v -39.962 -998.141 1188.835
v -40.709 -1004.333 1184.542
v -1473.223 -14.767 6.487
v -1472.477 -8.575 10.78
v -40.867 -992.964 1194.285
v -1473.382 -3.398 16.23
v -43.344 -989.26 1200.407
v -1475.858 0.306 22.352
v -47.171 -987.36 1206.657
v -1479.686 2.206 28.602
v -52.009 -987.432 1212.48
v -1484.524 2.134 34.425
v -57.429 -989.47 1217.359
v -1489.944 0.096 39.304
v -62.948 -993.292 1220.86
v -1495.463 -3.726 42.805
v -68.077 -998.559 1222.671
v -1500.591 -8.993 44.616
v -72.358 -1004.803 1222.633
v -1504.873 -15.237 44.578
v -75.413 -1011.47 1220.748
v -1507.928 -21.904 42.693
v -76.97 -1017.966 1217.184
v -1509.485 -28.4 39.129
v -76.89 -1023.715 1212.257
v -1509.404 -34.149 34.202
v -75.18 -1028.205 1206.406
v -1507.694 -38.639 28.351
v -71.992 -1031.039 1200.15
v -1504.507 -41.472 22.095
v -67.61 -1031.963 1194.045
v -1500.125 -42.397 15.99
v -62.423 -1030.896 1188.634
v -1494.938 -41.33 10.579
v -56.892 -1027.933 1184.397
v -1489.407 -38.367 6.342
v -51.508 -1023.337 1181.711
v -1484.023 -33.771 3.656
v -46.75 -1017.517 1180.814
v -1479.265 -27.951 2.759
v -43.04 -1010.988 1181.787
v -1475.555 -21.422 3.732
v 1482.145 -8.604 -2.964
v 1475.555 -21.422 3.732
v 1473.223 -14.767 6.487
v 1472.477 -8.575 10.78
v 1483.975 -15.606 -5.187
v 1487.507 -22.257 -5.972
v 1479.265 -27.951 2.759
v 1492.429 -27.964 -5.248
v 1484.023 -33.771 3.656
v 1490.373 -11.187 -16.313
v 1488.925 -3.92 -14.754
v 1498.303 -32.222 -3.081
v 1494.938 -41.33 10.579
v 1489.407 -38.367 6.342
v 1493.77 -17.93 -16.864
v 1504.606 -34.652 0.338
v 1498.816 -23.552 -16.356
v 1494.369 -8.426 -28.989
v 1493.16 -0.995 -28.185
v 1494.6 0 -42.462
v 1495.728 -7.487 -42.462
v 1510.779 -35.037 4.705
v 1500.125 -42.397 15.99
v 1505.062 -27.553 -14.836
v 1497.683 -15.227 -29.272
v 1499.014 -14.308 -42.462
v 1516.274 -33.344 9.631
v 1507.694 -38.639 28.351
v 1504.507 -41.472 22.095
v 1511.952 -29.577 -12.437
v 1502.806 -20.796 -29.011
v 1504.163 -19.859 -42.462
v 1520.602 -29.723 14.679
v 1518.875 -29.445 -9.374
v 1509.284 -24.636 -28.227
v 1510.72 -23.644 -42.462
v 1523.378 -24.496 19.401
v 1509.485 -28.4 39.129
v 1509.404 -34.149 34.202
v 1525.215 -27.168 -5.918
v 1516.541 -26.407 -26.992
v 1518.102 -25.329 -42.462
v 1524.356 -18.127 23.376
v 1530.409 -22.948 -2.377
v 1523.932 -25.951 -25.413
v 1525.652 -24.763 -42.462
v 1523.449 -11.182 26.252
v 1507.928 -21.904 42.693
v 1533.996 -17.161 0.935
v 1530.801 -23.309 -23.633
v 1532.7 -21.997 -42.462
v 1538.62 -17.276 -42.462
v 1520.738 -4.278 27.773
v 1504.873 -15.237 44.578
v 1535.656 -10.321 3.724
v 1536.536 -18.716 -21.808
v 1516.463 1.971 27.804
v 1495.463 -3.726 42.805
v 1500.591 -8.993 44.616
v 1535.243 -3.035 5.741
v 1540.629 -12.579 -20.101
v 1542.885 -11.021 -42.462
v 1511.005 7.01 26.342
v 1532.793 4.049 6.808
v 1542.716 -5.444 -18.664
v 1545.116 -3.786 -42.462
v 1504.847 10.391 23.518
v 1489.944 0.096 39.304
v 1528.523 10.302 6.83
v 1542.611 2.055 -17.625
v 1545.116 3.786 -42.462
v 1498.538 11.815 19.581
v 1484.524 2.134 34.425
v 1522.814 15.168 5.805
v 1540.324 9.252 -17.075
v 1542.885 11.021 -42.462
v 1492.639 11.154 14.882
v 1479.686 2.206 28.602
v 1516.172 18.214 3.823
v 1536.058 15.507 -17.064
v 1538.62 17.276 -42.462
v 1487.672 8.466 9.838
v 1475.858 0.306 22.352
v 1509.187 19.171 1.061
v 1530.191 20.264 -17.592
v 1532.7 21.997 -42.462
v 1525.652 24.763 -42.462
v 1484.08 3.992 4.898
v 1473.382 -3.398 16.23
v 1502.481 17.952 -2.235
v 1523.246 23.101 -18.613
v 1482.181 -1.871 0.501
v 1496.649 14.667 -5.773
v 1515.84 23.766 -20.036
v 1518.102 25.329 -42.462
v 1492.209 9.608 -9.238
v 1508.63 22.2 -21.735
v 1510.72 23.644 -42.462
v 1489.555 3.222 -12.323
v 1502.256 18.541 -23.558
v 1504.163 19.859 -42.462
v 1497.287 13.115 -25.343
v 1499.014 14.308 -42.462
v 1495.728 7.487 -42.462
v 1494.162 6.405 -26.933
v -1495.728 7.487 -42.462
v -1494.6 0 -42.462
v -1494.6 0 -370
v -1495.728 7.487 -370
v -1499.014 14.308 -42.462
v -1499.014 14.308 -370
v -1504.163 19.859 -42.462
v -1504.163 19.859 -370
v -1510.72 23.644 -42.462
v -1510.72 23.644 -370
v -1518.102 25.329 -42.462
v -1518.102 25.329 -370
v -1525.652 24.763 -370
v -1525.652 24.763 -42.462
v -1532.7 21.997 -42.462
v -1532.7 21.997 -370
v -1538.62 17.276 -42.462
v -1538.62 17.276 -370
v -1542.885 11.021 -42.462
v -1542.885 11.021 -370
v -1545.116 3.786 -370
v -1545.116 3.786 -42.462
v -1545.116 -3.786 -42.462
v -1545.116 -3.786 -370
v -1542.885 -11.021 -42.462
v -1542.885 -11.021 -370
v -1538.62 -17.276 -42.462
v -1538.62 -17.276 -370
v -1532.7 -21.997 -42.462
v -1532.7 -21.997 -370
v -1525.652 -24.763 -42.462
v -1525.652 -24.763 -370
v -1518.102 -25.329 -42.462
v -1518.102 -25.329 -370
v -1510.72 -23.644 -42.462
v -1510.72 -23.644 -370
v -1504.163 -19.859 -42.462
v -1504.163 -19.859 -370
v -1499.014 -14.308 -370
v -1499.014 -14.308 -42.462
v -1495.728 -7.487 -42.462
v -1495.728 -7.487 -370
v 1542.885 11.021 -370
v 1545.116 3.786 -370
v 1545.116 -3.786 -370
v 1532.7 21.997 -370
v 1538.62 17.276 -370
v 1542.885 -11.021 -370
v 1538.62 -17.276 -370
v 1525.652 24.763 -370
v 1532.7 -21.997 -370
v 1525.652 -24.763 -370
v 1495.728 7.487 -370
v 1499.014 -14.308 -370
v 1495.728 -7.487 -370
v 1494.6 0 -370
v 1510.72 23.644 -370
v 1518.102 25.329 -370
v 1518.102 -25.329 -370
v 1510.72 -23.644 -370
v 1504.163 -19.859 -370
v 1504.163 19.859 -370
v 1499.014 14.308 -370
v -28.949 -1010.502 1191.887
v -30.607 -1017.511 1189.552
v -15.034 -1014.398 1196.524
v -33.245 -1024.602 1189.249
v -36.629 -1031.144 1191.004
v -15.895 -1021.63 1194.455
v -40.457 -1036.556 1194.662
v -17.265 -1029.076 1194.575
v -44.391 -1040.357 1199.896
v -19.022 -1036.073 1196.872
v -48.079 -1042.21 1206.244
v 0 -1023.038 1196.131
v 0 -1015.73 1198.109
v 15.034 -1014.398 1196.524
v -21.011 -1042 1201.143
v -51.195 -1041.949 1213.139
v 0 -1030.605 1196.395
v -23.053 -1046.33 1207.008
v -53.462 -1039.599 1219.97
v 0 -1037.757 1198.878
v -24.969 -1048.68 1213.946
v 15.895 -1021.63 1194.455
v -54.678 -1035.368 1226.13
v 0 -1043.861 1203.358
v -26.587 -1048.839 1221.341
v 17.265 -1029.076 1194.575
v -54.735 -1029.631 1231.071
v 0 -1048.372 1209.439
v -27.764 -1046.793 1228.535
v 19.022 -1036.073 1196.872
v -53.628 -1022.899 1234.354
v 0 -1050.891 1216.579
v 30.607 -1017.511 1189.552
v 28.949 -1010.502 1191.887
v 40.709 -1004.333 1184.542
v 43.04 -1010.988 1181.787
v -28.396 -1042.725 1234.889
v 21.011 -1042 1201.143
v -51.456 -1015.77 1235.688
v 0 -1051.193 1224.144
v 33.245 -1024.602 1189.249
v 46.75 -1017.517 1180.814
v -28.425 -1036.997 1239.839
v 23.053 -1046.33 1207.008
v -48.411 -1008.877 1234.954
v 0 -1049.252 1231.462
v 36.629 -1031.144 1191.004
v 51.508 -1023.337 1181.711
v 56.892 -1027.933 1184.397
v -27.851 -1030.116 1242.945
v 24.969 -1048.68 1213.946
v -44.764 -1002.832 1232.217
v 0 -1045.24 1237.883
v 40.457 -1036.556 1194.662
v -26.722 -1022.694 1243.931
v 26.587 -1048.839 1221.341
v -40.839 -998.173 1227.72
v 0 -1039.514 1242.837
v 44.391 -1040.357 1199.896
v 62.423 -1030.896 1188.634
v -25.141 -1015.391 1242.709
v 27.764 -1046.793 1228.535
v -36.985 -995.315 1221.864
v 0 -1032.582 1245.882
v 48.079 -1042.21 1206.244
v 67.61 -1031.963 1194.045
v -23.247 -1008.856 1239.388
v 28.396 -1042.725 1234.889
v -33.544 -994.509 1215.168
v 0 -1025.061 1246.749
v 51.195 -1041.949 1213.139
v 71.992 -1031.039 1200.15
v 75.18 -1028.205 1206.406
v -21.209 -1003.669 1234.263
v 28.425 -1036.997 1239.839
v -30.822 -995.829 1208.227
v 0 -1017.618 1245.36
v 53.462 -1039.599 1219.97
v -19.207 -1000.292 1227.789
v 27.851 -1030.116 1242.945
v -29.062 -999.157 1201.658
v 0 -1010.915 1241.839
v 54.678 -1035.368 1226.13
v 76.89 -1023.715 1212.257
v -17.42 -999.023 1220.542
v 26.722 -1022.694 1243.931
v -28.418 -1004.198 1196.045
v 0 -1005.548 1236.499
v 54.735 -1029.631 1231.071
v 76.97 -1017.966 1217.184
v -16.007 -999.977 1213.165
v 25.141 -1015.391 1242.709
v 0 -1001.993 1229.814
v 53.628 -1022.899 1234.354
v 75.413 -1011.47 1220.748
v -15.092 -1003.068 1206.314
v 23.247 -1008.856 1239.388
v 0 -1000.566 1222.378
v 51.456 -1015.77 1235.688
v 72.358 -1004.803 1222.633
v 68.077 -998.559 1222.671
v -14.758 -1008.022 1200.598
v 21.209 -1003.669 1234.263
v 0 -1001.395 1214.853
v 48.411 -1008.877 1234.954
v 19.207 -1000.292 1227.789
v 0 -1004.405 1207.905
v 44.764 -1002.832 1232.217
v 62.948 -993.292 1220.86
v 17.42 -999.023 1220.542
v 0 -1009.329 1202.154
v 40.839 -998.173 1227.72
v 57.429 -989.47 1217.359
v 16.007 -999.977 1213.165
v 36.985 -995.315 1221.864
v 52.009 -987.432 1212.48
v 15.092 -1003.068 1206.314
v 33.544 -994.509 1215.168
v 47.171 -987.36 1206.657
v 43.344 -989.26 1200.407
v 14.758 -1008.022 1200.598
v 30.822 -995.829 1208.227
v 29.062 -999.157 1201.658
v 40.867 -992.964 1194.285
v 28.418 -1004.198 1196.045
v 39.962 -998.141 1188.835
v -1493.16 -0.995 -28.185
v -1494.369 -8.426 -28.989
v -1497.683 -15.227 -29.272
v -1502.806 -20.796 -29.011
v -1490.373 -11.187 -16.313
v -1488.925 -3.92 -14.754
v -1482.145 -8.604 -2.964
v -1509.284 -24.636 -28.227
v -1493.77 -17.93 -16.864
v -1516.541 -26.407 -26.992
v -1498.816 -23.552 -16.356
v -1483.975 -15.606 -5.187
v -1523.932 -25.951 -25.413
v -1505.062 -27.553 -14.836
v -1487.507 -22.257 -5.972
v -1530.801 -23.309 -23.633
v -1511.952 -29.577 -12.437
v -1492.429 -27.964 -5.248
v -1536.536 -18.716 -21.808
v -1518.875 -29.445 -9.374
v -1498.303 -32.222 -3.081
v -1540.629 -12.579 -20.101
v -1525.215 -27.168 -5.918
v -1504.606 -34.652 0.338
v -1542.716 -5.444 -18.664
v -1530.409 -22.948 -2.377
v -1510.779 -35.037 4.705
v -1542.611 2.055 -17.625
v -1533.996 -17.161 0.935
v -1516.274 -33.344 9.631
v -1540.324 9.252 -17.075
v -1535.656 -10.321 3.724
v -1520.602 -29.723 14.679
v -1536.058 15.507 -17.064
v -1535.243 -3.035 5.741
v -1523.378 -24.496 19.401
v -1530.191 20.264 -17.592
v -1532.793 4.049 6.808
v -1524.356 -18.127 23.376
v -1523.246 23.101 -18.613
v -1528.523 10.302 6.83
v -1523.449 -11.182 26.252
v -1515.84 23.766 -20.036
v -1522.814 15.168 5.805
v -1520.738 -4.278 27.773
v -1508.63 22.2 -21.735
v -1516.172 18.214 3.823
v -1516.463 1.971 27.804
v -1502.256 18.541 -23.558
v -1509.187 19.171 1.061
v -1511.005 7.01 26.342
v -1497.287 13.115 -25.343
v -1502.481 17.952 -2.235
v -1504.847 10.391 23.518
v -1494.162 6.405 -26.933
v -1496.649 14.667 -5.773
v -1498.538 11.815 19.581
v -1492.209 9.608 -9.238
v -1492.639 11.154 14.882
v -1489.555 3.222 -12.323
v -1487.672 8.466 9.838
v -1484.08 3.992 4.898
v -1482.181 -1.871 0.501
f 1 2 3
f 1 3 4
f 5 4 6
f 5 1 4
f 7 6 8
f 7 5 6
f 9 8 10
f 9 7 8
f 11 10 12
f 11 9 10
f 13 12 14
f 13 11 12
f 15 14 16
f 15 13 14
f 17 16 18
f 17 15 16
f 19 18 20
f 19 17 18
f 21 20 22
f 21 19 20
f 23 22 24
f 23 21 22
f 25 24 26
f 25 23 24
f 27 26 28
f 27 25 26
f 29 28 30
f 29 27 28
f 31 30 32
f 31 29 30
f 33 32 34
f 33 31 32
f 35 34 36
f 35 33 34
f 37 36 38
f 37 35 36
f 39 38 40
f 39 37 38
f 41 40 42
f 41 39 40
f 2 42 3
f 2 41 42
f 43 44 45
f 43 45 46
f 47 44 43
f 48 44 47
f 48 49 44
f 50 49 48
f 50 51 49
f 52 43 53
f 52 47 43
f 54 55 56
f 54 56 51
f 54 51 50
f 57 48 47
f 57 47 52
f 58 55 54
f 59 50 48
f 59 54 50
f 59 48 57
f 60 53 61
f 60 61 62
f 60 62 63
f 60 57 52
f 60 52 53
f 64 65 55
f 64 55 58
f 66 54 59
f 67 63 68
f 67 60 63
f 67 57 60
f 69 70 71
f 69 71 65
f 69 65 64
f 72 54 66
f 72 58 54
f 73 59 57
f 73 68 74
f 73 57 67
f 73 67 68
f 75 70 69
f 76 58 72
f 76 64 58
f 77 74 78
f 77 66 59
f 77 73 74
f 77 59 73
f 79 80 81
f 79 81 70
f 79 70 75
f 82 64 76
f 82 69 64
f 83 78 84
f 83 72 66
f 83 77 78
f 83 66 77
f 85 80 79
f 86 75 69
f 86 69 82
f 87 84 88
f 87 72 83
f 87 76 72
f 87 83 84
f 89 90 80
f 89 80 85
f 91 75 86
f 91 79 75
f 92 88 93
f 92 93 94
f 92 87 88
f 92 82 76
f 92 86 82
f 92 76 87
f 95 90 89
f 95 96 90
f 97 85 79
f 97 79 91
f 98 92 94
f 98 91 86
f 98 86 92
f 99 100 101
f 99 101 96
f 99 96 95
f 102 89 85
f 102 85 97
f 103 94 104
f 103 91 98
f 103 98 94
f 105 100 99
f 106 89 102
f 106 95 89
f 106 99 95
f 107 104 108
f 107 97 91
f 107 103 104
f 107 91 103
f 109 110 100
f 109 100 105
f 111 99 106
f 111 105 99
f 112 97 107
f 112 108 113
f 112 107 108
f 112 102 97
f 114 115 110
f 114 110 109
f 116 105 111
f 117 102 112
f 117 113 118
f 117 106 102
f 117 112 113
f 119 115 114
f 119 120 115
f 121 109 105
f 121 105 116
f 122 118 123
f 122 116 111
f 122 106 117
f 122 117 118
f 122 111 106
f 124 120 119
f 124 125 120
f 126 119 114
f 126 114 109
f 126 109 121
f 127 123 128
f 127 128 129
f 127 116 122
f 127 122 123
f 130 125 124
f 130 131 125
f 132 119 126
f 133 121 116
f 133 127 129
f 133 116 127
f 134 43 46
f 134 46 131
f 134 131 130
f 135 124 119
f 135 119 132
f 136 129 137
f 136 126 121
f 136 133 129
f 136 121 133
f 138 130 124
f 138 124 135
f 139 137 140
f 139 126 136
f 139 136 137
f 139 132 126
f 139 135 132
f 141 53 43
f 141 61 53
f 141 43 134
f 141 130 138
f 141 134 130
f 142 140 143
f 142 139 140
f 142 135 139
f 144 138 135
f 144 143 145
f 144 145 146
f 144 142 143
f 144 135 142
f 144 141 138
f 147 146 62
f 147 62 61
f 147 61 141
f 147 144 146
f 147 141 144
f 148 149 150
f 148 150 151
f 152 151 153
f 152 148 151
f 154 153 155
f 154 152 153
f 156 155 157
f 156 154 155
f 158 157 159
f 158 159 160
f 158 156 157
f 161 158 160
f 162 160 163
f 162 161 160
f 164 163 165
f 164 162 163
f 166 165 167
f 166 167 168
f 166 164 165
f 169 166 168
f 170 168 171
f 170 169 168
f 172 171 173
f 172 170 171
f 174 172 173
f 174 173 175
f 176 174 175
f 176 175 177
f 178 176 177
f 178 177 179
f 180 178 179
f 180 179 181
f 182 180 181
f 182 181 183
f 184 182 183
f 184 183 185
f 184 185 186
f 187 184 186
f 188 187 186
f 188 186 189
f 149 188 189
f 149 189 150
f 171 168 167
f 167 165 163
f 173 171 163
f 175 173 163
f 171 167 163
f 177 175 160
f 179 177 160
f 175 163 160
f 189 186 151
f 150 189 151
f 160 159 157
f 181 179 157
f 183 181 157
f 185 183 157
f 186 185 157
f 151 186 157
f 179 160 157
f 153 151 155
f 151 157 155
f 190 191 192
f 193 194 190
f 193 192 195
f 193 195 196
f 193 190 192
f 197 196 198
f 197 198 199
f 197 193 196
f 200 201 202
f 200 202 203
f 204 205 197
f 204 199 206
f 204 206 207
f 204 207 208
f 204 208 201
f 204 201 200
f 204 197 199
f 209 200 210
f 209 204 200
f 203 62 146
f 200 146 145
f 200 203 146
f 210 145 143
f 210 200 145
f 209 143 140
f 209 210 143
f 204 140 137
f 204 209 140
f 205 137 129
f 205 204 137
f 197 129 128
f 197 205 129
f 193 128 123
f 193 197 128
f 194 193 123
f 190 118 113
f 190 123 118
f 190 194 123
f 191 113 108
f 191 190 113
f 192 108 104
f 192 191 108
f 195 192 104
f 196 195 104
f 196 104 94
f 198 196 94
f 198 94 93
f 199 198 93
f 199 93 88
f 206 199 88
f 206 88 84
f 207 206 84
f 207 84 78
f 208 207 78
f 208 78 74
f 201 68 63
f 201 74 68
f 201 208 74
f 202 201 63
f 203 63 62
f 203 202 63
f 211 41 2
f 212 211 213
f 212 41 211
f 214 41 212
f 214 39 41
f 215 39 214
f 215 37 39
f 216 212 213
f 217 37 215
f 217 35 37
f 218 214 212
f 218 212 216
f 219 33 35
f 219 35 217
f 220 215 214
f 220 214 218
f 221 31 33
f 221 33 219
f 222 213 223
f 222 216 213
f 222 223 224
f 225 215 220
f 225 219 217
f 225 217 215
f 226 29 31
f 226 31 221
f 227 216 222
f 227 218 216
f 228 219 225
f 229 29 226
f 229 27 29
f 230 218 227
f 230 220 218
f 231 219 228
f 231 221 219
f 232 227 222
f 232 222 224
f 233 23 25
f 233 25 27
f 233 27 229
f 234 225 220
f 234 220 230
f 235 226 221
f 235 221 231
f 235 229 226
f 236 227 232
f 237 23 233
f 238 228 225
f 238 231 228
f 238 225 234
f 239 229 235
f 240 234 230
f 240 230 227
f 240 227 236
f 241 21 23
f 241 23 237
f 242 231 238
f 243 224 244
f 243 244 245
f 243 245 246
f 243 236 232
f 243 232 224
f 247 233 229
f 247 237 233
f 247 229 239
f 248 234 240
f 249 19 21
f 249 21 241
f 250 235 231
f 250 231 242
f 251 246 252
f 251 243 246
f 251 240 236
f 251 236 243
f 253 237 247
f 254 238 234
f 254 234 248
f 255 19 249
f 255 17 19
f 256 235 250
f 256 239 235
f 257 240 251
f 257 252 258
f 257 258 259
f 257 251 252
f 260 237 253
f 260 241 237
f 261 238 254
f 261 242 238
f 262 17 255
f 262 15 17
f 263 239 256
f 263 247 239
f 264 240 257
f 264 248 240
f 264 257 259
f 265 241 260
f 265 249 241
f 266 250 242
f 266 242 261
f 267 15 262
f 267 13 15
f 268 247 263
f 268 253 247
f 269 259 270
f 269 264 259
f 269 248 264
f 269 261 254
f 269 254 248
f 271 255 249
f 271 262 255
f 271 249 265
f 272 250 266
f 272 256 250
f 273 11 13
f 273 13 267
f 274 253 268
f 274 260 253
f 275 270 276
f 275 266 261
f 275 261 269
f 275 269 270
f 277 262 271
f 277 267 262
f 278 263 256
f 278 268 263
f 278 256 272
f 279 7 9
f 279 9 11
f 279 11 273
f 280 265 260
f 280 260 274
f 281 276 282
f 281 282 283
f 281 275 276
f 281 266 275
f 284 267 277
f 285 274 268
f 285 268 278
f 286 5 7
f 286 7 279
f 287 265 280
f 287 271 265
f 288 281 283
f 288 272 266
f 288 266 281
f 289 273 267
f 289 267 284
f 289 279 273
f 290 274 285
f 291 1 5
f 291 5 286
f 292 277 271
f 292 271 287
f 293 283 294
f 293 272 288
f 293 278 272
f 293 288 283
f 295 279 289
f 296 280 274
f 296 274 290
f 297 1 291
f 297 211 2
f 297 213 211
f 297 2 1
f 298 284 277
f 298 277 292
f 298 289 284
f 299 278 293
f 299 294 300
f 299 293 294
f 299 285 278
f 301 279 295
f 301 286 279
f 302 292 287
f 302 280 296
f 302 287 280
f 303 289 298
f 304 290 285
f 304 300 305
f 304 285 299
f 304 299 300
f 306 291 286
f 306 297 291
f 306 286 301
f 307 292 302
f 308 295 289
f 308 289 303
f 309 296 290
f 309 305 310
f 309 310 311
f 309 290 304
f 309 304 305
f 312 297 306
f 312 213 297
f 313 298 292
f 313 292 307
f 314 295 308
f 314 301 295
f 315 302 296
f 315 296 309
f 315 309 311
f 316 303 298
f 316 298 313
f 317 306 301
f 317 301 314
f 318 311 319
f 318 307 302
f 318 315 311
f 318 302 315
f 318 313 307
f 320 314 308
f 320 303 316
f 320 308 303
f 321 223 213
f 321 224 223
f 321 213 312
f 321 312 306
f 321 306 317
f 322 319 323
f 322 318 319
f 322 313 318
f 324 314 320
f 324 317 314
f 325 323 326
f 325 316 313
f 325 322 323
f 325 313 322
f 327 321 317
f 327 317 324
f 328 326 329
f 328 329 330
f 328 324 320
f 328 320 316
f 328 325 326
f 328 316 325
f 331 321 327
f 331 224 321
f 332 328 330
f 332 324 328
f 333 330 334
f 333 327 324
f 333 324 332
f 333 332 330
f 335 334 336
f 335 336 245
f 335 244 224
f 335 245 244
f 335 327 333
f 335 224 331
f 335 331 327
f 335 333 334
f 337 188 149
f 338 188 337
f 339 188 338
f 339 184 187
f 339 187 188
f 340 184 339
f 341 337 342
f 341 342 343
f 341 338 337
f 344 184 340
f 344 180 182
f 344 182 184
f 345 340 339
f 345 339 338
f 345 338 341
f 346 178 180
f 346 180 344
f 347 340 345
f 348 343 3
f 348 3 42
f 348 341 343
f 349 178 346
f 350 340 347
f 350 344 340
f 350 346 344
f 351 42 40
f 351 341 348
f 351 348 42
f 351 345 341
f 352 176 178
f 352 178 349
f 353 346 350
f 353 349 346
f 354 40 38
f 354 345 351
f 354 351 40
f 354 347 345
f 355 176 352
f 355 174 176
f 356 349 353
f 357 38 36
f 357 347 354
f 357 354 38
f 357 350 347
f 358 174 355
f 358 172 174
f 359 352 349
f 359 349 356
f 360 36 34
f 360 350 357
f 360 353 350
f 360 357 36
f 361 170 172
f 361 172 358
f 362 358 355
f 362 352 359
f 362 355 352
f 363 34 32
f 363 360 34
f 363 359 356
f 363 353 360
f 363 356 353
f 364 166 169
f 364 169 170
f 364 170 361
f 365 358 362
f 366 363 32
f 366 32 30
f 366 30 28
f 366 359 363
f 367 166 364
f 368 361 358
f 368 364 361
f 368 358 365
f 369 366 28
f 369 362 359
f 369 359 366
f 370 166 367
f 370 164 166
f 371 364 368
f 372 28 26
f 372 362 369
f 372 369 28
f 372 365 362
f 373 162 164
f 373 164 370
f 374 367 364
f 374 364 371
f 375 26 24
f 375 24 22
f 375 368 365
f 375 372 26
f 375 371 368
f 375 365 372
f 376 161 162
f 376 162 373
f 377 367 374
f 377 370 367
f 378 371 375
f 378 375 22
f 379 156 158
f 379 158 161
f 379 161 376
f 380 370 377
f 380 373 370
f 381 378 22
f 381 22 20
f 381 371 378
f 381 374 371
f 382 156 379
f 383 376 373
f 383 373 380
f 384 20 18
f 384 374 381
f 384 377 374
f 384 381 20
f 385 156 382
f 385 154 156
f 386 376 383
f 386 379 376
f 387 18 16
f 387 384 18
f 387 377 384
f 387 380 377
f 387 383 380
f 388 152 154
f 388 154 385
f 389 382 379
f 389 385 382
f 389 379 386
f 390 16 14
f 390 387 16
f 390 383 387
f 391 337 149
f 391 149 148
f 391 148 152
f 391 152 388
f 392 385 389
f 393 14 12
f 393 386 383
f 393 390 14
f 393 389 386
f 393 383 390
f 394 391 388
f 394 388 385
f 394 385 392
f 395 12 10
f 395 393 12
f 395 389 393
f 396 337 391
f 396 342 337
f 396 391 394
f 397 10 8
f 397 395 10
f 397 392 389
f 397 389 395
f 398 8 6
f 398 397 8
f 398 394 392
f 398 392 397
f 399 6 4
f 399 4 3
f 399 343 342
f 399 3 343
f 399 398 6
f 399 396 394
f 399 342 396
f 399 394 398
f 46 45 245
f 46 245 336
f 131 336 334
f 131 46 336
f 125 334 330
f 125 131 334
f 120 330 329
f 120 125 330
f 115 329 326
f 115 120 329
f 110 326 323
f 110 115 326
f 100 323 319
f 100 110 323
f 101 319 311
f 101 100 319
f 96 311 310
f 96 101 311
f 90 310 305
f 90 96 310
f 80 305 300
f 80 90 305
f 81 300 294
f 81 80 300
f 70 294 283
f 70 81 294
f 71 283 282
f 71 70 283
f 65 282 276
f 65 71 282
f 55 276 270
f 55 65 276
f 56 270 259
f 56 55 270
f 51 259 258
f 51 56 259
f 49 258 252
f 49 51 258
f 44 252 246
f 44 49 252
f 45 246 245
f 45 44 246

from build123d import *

# Parameters (mm, degrees)
CROQUIS5_R = 25.4


with BuildPart() as part:
    # Barrer1: sweep along a curve in space
    with BuildLine() as barrer1_path:
        Line((-1520, 0, -370), (-1520, 0, -42.462209189))
        ThreePointArc((-1520, 0, -42.462209189), (-1512.31780522, -5.306779289, -4.955826649), (-1491.064421296, -19.988393184, 23.795706171))
        Line((-1491.064421296, -19.988393184, 23.795706171), (-58.549689027, -1009.554491133, 1201.850584682))
        ThreePointArc((-58.549689027, -1009.554491133, 1201.850584682), (0, -1025.945954224, 1221.364231219), (58.549689027, -1009.554491133, 1201.850584682))
        Line((58.549689027, -1009.554491133, 1201.850584682), (1491.064421296, -19.988393184, 23.795706171))
        ThreePointArc((1491.064421296, -19.988393184, 23.795706171), (1512.31780522, -5.306779289, -4.955826649), (1520, 0, -42.462209189))
        Line((1520, 0, -42.462209189), (1520, 0, -370))
    # Croquis5 → Barrer1 (sweep)
    with BuildSketch(Plane.XY.offset(-370)):
        with Locations((-1520, 0)):
            Circle(CROQUIS5_R)
    sweep(path=barrer1_path.line)


solid = part.part
